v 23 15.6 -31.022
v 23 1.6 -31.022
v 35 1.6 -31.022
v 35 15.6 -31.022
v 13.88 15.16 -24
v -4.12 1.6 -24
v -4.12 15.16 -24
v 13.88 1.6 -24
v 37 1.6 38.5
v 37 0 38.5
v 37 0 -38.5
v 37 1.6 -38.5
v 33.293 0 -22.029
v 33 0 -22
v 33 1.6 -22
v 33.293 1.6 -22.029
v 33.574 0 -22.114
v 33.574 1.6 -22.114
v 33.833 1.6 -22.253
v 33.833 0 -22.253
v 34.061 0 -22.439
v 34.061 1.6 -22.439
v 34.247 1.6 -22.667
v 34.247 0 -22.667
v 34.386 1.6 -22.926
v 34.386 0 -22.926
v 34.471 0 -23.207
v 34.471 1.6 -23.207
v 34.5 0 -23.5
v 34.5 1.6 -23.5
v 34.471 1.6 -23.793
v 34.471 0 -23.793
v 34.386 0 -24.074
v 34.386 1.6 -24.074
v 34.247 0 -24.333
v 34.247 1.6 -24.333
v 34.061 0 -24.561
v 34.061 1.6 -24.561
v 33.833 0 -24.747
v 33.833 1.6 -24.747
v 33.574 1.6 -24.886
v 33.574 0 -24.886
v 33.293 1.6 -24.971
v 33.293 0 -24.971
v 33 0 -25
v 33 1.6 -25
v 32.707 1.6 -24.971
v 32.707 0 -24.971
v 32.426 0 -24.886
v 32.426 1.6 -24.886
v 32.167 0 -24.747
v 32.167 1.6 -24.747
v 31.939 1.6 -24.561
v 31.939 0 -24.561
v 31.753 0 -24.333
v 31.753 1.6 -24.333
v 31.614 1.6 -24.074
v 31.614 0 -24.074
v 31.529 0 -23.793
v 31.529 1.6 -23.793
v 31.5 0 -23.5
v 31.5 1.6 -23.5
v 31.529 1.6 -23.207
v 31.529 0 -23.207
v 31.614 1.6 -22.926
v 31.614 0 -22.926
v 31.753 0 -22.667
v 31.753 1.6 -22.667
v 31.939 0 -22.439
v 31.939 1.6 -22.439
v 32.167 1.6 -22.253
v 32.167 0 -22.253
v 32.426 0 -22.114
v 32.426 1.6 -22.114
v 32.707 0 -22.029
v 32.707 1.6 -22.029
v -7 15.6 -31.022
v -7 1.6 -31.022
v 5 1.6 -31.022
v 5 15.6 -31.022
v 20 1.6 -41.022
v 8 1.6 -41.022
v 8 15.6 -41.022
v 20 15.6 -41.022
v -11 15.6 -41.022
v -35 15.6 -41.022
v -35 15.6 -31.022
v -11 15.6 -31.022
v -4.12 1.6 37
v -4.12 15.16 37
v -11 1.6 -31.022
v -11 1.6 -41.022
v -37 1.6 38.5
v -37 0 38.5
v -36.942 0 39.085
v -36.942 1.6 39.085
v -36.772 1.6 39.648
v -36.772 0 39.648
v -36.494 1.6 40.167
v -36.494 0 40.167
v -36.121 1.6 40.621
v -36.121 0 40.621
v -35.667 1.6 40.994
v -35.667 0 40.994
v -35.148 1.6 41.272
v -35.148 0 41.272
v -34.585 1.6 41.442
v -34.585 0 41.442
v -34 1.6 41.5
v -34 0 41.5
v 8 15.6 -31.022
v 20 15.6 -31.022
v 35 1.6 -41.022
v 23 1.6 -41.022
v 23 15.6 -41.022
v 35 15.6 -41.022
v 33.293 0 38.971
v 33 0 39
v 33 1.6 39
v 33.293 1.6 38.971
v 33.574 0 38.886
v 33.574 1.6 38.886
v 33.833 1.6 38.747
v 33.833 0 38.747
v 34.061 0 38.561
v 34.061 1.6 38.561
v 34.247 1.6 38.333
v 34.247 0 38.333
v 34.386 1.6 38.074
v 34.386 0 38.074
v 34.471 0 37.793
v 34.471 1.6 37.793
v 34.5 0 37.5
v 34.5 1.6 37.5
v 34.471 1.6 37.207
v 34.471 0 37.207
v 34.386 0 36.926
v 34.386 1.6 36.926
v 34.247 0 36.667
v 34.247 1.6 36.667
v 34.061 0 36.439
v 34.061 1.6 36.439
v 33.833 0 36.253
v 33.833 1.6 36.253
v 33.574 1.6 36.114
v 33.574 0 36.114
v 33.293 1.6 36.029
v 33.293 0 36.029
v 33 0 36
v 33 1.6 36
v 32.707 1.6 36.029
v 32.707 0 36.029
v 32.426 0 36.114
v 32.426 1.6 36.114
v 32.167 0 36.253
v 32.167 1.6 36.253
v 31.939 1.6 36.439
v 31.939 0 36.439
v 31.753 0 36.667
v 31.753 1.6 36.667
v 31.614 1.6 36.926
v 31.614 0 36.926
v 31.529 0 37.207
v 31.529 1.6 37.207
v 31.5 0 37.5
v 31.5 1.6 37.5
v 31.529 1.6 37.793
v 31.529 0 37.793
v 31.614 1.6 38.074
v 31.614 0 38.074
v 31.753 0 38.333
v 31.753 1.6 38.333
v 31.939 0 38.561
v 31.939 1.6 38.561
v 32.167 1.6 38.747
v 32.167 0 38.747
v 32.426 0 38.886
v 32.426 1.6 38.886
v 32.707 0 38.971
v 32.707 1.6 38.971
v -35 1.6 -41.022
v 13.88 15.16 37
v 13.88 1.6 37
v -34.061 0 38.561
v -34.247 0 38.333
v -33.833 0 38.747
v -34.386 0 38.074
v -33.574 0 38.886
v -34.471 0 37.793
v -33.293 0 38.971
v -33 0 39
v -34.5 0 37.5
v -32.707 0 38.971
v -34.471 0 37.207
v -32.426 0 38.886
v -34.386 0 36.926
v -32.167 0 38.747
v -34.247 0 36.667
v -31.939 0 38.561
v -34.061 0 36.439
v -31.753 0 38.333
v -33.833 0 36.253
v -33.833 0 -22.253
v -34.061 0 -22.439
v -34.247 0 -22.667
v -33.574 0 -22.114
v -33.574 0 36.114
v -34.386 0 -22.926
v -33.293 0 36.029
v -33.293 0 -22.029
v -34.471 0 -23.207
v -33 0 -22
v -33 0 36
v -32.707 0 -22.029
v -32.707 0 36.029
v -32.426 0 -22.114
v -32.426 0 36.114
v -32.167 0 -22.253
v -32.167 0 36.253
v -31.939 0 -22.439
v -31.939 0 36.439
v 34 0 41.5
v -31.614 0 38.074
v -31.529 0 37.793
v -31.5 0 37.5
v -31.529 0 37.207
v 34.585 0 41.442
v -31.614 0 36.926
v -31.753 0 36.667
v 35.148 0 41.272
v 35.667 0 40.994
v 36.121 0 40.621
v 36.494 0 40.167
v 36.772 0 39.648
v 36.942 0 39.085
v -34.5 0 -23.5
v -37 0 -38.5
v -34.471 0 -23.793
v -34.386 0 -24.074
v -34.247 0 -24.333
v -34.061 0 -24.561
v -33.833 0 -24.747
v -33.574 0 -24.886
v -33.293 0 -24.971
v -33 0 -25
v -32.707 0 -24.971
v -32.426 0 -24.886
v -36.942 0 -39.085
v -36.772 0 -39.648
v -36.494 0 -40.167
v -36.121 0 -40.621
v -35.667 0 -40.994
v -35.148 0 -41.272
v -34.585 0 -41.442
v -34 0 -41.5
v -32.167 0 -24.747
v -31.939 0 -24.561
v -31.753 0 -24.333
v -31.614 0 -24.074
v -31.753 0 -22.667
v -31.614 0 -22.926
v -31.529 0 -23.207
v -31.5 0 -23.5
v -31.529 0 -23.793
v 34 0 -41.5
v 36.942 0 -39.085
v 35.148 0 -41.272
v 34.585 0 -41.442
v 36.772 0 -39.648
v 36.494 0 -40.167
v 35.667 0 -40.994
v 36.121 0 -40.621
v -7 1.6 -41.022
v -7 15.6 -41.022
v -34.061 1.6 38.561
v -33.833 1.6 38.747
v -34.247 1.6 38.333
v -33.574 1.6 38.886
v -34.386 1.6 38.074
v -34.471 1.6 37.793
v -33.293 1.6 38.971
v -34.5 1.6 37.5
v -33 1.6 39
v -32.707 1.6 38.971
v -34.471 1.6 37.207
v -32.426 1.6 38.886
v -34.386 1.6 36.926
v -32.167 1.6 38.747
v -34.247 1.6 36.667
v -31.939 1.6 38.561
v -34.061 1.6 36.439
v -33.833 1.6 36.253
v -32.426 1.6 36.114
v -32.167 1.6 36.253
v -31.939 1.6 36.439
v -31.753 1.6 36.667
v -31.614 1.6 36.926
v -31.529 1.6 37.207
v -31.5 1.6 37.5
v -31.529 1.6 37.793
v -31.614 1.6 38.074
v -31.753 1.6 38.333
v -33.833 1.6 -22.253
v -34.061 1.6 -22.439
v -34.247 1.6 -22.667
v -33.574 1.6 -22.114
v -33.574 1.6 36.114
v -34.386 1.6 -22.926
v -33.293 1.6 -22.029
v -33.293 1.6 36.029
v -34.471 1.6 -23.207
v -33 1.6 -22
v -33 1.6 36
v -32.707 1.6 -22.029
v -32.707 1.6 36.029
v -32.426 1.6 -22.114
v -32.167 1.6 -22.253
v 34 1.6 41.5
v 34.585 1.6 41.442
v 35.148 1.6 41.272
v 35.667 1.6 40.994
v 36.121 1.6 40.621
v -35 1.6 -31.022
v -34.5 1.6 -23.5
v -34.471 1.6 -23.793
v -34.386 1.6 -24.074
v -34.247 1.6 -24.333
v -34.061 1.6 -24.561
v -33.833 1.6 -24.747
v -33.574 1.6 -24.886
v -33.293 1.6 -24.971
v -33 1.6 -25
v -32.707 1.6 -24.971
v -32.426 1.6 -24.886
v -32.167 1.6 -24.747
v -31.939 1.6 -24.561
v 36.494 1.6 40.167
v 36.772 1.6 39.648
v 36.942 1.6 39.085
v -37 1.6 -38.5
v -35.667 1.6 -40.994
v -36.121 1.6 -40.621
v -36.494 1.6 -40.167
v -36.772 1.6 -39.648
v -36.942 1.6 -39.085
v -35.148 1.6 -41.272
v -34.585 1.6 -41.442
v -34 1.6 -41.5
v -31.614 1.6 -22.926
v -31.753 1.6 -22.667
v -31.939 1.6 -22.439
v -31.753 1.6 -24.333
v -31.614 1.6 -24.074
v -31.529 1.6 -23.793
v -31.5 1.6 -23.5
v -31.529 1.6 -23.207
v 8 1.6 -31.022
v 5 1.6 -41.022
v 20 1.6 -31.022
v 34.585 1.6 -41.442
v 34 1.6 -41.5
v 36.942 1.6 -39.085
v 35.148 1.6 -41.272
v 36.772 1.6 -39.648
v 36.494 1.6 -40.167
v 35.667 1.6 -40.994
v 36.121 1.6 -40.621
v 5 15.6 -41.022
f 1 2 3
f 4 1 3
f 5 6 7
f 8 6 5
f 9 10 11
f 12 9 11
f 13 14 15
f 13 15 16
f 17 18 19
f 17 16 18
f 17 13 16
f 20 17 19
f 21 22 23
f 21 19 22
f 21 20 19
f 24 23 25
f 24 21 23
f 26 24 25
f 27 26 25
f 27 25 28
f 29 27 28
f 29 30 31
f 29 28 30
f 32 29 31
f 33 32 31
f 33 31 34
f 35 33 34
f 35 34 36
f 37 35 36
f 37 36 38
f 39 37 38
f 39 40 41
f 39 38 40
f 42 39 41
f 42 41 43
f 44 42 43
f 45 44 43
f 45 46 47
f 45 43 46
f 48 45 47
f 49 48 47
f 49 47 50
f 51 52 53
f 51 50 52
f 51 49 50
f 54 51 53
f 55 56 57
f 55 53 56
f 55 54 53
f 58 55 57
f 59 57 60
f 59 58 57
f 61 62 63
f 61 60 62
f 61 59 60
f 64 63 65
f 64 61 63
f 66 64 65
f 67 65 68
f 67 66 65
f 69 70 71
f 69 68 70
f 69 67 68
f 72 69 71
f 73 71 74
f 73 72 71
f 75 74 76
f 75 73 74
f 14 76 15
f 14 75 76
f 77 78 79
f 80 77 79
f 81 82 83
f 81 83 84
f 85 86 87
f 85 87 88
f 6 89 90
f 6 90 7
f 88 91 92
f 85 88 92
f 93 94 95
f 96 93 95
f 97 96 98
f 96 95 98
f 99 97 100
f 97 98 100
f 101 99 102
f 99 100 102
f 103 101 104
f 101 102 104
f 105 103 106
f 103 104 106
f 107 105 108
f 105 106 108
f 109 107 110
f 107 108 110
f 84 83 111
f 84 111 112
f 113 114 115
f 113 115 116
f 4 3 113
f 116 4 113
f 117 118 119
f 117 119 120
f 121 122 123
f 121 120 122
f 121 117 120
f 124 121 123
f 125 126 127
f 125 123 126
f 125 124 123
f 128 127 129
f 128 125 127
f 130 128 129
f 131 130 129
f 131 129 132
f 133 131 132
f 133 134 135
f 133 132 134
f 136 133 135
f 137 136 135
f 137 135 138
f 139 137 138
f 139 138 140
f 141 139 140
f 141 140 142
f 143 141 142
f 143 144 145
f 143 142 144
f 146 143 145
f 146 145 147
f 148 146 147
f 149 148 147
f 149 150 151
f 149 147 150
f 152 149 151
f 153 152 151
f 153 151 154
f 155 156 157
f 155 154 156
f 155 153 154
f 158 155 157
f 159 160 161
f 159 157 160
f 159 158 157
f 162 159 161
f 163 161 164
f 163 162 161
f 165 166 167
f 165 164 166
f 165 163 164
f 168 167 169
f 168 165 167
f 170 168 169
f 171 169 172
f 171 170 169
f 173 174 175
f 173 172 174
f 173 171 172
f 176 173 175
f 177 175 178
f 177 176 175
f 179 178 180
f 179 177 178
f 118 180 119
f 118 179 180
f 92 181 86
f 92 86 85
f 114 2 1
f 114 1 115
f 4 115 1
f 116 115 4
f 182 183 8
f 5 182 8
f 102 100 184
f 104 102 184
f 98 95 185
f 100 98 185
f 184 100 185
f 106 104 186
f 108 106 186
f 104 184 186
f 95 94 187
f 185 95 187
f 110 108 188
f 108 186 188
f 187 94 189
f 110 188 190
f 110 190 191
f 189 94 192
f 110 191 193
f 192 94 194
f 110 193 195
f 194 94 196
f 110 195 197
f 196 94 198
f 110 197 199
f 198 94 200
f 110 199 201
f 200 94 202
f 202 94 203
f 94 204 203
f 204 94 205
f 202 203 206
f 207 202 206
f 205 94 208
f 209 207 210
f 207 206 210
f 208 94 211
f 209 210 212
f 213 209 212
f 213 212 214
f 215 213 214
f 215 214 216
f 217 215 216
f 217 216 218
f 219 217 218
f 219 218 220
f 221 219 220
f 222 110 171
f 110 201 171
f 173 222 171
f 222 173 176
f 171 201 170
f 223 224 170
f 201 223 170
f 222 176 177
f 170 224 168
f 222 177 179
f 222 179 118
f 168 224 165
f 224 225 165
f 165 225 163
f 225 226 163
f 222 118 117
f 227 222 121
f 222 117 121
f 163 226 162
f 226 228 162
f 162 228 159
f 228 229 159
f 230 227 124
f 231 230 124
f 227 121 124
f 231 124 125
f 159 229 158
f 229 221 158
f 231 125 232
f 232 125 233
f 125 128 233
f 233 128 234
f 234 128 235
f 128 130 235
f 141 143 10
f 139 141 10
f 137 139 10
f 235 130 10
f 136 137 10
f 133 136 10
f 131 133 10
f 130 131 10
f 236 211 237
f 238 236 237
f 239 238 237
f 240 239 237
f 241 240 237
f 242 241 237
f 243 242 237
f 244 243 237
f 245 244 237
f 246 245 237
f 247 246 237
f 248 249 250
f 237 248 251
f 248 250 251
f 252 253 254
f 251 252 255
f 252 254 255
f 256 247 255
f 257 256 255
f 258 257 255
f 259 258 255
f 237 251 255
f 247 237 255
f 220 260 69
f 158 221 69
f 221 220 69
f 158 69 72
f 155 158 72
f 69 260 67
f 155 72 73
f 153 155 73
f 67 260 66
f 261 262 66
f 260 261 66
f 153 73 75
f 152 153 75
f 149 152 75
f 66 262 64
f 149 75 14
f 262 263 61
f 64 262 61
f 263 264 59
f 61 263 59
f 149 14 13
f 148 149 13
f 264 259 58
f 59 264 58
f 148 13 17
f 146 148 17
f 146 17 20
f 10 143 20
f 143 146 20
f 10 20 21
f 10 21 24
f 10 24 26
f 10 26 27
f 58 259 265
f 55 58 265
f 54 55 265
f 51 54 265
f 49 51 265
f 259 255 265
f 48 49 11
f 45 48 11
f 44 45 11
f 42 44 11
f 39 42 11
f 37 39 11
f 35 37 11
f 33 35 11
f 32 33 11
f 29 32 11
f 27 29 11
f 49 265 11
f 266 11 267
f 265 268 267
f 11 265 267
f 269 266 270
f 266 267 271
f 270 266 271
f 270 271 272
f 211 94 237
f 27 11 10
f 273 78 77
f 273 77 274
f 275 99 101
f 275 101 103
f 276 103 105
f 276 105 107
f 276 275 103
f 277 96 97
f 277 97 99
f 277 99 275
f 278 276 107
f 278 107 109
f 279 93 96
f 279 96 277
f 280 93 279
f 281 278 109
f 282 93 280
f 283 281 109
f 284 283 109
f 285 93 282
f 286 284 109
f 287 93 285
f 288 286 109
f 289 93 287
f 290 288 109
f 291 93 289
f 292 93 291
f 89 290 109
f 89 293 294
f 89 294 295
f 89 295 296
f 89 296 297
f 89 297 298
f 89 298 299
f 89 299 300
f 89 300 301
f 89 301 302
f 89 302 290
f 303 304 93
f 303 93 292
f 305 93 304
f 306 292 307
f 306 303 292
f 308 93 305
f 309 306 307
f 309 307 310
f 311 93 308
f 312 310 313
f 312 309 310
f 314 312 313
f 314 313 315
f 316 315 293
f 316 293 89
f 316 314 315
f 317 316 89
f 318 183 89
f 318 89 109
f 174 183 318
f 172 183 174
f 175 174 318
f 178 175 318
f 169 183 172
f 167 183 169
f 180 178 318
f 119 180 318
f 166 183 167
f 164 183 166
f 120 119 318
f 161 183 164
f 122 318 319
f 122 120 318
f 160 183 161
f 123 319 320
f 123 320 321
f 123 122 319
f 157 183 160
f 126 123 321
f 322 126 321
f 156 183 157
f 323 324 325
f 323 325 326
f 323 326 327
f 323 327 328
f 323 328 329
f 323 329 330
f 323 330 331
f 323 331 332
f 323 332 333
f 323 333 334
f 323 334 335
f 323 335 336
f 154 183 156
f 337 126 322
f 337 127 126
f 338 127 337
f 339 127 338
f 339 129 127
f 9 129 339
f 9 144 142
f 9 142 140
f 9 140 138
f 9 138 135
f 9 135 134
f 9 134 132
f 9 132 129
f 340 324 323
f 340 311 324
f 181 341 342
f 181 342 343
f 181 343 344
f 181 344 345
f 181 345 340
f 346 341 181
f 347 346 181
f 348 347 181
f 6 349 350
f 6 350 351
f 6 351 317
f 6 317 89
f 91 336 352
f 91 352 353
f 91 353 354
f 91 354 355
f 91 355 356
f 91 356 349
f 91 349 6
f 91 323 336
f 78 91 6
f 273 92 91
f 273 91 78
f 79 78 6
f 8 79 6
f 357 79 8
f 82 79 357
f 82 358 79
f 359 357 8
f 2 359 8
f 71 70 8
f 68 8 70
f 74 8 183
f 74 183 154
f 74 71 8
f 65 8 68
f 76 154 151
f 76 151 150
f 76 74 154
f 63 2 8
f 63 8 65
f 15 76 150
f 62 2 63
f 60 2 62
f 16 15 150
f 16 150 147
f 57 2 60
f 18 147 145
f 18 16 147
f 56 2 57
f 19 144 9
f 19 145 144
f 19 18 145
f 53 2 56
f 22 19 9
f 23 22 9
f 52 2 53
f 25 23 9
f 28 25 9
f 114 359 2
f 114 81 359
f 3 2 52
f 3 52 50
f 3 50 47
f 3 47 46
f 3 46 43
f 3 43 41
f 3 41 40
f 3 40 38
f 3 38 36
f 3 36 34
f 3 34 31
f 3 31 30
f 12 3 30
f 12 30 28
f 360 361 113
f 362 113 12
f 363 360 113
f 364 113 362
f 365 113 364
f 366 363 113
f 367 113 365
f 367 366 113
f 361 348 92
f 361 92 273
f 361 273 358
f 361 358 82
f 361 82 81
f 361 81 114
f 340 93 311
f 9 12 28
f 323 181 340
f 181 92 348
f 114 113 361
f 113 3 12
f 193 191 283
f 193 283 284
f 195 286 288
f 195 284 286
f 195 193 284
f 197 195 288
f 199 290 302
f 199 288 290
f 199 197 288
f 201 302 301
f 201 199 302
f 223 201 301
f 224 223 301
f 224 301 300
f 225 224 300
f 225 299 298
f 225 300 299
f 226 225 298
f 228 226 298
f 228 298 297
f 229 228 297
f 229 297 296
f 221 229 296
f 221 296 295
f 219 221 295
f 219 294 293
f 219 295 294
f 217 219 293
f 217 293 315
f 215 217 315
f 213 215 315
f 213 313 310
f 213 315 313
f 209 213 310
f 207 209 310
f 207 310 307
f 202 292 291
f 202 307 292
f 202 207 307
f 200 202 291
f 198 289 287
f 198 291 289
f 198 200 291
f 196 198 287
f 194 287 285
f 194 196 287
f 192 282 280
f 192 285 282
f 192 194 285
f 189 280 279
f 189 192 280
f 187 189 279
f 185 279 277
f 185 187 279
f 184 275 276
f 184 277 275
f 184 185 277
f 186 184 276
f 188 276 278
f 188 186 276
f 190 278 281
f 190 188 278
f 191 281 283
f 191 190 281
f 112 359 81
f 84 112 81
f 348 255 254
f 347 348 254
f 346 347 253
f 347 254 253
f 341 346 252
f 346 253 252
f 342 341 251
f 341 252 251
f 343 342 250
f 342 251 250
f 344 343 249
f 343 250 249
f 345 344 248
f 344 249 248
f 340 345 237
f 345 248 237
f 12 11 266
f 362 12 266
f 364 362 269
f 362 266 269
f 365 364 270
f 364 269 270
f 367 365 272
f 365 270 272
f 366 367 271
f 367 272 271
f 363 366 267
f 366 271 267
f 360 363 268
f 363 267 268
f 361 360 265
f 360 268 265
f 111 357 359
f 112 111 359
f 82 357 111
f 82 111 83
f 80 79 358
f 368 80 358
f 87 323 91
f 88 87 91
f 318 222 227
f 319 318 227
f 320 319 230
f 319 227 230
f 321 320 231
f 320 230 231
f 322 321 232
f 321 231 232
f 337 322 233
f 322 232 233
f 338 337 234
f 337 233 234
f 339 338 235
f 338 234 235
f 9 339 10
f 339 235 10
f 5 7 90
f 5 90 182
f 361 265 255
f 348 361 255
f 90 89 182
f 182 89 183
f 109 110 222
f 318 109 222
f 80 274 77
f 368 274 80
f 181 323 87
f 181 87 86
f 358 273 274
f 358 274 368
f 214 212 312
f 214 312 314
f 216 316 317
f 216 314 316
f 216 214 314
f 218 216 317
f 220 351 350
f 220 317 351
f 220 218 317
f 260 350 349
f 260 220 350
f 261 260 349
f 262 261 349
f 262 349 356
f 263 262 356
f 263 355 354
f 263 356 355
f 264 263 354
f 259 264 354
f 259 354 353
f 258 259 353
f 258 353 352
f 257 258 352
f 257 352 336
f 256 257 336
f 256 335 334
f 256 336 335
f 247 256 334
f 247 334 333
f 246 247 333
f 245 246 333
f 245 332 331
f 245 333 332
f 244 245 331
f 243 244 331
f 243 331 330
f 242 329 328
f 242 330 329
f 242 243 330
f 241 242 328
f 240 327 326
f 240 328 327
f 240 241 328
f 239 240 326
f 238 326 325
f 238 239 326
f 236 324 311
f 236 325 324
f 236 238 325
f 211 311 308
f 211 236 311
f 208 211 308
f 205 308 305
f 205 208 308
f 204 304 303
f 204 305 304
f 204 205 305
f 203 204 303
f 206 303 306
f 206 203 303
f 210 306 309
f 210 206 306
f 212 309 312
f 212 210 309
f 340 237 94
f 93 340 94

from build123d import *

# Parameters (mm, degrees)
BOSS_EXTRUDE1_DEPTH     = 1.6
CUT_EXTRUDE1_DEPTH      = 56.62202801
CUT_EXTRUDE1_DEPTH_BACK = 56.62202801
SKETCH3_R               = 1.5
SKETCH4_W               = 24
SKETCH4_H               = 10
SKETCH4_W_2             = 12
BOSS_EXTRUDE2_DEPTH     = 14
SKETCH5_W               = 18
SKETCH5_H               = 61
BOSS_EXTRUDE3_DEPTH     = 13.56


with BuildPart() as part:
    # Sketch2 → Boss-Extrude1 (new body)
    with BuildSketch(Plane(origin=(0, 0, 0), x_dir=(1, 0, 0), z_dir=(0, 1, 0))):
        with BuildLine():
            Line((34, 41.5), (-34, 41.5))
            ThreePointArc((-34, 41.5), (-36.121320344, 40.621320344), (-37, 38.5))
            Line((-37, 38.5), (-37, -38.5))
            ThreePointArc((-37, -38.5), (-36.121320344, -40.621320344), (-34, -41.5))
            Line((-34, -41.5), (34, -41.5))
            ThreePointArc((34, -41.5), (36.121320344, -40.621320344), (37, -38.5))
            Line((37, -38.5), (37, 38.5))
            ThreePointArc((37, 38.5), (36.121320344, 40.621320344), (34, 41.5))
        make_face()
    extrude(amount=BOSS_EXTRUDE1_DEPTH)

    # Sketch3 → Cut-Extrude1 (cut, two sides: drawn at the far end of the back side and taken through both)
    with BuildSketch(Plane(origin=(0, 1.6, 0), x_dir=(1, 0, 0), z_dir=(0, 1, 0)).offset(-CUT_EXTRUDE1_DEPTH_BACK)):
        with Locations(Location((-33, 23.5, 0), (0, 0, 270))):
            Circle(SKETCH3_R)
        with Locations(Location((33, 23.5, 0), (0, 0, 270))):
            Circle(SKETCH3_R)
        with Locations(Location((-33, -37.5, 0), (0, 0, 270))):
            Circle(SKETCH3_R)
        with Locations(Location((33, -37.5, 0), (0, 0, 270))):
            Circle(SKETCH3_R)
    extrude(amount=CUT_EXTRUDE1_DEPTH + CUT_EXTRUDE1_DEPTH_BACK, mode=Mode.SUBTRACT)

    # Sketch4 → Boss-Extrude2 (add)
    with BuildSketch(Plane(origin=(0, 1.6, 0), x_dir=(1, 0, 0), z_dir=(0, 1, 0))):
        with Locations((-23, 36.022367187)):
            Rectangle(SKETCH4_W, SKETCH4_H)
        with Locations((-1, 36.022367187)):
            Rectangle(SKETCH4_W_2, SKETCH4_H)
        with Locations((14, 36.022367187)):
            Rectangle(SKETCH4_W_2, SKETCH4_H)
        with Locations((29, 36.022367187)):
            Rectangle(SKETCH4_W_2, SKETCH4_H)
    extrude(amount=BOSS_EXTRUDE2_DEPTH)

    # Sketch5 → Boss-Extrude3 (add)
    with BuildSketch(Plane(origin=(0, 1.6, 0), x_dir=(1, 0, 0), z_dir=(0, 1, 0))):
        with Locations((4.88, -6.5)):
            Rectangle(SKETCH5_W, SKETCH5_H)
    extrude(amount=BOSS_EXTRUDE3_DEPTH)


solid = part.part
